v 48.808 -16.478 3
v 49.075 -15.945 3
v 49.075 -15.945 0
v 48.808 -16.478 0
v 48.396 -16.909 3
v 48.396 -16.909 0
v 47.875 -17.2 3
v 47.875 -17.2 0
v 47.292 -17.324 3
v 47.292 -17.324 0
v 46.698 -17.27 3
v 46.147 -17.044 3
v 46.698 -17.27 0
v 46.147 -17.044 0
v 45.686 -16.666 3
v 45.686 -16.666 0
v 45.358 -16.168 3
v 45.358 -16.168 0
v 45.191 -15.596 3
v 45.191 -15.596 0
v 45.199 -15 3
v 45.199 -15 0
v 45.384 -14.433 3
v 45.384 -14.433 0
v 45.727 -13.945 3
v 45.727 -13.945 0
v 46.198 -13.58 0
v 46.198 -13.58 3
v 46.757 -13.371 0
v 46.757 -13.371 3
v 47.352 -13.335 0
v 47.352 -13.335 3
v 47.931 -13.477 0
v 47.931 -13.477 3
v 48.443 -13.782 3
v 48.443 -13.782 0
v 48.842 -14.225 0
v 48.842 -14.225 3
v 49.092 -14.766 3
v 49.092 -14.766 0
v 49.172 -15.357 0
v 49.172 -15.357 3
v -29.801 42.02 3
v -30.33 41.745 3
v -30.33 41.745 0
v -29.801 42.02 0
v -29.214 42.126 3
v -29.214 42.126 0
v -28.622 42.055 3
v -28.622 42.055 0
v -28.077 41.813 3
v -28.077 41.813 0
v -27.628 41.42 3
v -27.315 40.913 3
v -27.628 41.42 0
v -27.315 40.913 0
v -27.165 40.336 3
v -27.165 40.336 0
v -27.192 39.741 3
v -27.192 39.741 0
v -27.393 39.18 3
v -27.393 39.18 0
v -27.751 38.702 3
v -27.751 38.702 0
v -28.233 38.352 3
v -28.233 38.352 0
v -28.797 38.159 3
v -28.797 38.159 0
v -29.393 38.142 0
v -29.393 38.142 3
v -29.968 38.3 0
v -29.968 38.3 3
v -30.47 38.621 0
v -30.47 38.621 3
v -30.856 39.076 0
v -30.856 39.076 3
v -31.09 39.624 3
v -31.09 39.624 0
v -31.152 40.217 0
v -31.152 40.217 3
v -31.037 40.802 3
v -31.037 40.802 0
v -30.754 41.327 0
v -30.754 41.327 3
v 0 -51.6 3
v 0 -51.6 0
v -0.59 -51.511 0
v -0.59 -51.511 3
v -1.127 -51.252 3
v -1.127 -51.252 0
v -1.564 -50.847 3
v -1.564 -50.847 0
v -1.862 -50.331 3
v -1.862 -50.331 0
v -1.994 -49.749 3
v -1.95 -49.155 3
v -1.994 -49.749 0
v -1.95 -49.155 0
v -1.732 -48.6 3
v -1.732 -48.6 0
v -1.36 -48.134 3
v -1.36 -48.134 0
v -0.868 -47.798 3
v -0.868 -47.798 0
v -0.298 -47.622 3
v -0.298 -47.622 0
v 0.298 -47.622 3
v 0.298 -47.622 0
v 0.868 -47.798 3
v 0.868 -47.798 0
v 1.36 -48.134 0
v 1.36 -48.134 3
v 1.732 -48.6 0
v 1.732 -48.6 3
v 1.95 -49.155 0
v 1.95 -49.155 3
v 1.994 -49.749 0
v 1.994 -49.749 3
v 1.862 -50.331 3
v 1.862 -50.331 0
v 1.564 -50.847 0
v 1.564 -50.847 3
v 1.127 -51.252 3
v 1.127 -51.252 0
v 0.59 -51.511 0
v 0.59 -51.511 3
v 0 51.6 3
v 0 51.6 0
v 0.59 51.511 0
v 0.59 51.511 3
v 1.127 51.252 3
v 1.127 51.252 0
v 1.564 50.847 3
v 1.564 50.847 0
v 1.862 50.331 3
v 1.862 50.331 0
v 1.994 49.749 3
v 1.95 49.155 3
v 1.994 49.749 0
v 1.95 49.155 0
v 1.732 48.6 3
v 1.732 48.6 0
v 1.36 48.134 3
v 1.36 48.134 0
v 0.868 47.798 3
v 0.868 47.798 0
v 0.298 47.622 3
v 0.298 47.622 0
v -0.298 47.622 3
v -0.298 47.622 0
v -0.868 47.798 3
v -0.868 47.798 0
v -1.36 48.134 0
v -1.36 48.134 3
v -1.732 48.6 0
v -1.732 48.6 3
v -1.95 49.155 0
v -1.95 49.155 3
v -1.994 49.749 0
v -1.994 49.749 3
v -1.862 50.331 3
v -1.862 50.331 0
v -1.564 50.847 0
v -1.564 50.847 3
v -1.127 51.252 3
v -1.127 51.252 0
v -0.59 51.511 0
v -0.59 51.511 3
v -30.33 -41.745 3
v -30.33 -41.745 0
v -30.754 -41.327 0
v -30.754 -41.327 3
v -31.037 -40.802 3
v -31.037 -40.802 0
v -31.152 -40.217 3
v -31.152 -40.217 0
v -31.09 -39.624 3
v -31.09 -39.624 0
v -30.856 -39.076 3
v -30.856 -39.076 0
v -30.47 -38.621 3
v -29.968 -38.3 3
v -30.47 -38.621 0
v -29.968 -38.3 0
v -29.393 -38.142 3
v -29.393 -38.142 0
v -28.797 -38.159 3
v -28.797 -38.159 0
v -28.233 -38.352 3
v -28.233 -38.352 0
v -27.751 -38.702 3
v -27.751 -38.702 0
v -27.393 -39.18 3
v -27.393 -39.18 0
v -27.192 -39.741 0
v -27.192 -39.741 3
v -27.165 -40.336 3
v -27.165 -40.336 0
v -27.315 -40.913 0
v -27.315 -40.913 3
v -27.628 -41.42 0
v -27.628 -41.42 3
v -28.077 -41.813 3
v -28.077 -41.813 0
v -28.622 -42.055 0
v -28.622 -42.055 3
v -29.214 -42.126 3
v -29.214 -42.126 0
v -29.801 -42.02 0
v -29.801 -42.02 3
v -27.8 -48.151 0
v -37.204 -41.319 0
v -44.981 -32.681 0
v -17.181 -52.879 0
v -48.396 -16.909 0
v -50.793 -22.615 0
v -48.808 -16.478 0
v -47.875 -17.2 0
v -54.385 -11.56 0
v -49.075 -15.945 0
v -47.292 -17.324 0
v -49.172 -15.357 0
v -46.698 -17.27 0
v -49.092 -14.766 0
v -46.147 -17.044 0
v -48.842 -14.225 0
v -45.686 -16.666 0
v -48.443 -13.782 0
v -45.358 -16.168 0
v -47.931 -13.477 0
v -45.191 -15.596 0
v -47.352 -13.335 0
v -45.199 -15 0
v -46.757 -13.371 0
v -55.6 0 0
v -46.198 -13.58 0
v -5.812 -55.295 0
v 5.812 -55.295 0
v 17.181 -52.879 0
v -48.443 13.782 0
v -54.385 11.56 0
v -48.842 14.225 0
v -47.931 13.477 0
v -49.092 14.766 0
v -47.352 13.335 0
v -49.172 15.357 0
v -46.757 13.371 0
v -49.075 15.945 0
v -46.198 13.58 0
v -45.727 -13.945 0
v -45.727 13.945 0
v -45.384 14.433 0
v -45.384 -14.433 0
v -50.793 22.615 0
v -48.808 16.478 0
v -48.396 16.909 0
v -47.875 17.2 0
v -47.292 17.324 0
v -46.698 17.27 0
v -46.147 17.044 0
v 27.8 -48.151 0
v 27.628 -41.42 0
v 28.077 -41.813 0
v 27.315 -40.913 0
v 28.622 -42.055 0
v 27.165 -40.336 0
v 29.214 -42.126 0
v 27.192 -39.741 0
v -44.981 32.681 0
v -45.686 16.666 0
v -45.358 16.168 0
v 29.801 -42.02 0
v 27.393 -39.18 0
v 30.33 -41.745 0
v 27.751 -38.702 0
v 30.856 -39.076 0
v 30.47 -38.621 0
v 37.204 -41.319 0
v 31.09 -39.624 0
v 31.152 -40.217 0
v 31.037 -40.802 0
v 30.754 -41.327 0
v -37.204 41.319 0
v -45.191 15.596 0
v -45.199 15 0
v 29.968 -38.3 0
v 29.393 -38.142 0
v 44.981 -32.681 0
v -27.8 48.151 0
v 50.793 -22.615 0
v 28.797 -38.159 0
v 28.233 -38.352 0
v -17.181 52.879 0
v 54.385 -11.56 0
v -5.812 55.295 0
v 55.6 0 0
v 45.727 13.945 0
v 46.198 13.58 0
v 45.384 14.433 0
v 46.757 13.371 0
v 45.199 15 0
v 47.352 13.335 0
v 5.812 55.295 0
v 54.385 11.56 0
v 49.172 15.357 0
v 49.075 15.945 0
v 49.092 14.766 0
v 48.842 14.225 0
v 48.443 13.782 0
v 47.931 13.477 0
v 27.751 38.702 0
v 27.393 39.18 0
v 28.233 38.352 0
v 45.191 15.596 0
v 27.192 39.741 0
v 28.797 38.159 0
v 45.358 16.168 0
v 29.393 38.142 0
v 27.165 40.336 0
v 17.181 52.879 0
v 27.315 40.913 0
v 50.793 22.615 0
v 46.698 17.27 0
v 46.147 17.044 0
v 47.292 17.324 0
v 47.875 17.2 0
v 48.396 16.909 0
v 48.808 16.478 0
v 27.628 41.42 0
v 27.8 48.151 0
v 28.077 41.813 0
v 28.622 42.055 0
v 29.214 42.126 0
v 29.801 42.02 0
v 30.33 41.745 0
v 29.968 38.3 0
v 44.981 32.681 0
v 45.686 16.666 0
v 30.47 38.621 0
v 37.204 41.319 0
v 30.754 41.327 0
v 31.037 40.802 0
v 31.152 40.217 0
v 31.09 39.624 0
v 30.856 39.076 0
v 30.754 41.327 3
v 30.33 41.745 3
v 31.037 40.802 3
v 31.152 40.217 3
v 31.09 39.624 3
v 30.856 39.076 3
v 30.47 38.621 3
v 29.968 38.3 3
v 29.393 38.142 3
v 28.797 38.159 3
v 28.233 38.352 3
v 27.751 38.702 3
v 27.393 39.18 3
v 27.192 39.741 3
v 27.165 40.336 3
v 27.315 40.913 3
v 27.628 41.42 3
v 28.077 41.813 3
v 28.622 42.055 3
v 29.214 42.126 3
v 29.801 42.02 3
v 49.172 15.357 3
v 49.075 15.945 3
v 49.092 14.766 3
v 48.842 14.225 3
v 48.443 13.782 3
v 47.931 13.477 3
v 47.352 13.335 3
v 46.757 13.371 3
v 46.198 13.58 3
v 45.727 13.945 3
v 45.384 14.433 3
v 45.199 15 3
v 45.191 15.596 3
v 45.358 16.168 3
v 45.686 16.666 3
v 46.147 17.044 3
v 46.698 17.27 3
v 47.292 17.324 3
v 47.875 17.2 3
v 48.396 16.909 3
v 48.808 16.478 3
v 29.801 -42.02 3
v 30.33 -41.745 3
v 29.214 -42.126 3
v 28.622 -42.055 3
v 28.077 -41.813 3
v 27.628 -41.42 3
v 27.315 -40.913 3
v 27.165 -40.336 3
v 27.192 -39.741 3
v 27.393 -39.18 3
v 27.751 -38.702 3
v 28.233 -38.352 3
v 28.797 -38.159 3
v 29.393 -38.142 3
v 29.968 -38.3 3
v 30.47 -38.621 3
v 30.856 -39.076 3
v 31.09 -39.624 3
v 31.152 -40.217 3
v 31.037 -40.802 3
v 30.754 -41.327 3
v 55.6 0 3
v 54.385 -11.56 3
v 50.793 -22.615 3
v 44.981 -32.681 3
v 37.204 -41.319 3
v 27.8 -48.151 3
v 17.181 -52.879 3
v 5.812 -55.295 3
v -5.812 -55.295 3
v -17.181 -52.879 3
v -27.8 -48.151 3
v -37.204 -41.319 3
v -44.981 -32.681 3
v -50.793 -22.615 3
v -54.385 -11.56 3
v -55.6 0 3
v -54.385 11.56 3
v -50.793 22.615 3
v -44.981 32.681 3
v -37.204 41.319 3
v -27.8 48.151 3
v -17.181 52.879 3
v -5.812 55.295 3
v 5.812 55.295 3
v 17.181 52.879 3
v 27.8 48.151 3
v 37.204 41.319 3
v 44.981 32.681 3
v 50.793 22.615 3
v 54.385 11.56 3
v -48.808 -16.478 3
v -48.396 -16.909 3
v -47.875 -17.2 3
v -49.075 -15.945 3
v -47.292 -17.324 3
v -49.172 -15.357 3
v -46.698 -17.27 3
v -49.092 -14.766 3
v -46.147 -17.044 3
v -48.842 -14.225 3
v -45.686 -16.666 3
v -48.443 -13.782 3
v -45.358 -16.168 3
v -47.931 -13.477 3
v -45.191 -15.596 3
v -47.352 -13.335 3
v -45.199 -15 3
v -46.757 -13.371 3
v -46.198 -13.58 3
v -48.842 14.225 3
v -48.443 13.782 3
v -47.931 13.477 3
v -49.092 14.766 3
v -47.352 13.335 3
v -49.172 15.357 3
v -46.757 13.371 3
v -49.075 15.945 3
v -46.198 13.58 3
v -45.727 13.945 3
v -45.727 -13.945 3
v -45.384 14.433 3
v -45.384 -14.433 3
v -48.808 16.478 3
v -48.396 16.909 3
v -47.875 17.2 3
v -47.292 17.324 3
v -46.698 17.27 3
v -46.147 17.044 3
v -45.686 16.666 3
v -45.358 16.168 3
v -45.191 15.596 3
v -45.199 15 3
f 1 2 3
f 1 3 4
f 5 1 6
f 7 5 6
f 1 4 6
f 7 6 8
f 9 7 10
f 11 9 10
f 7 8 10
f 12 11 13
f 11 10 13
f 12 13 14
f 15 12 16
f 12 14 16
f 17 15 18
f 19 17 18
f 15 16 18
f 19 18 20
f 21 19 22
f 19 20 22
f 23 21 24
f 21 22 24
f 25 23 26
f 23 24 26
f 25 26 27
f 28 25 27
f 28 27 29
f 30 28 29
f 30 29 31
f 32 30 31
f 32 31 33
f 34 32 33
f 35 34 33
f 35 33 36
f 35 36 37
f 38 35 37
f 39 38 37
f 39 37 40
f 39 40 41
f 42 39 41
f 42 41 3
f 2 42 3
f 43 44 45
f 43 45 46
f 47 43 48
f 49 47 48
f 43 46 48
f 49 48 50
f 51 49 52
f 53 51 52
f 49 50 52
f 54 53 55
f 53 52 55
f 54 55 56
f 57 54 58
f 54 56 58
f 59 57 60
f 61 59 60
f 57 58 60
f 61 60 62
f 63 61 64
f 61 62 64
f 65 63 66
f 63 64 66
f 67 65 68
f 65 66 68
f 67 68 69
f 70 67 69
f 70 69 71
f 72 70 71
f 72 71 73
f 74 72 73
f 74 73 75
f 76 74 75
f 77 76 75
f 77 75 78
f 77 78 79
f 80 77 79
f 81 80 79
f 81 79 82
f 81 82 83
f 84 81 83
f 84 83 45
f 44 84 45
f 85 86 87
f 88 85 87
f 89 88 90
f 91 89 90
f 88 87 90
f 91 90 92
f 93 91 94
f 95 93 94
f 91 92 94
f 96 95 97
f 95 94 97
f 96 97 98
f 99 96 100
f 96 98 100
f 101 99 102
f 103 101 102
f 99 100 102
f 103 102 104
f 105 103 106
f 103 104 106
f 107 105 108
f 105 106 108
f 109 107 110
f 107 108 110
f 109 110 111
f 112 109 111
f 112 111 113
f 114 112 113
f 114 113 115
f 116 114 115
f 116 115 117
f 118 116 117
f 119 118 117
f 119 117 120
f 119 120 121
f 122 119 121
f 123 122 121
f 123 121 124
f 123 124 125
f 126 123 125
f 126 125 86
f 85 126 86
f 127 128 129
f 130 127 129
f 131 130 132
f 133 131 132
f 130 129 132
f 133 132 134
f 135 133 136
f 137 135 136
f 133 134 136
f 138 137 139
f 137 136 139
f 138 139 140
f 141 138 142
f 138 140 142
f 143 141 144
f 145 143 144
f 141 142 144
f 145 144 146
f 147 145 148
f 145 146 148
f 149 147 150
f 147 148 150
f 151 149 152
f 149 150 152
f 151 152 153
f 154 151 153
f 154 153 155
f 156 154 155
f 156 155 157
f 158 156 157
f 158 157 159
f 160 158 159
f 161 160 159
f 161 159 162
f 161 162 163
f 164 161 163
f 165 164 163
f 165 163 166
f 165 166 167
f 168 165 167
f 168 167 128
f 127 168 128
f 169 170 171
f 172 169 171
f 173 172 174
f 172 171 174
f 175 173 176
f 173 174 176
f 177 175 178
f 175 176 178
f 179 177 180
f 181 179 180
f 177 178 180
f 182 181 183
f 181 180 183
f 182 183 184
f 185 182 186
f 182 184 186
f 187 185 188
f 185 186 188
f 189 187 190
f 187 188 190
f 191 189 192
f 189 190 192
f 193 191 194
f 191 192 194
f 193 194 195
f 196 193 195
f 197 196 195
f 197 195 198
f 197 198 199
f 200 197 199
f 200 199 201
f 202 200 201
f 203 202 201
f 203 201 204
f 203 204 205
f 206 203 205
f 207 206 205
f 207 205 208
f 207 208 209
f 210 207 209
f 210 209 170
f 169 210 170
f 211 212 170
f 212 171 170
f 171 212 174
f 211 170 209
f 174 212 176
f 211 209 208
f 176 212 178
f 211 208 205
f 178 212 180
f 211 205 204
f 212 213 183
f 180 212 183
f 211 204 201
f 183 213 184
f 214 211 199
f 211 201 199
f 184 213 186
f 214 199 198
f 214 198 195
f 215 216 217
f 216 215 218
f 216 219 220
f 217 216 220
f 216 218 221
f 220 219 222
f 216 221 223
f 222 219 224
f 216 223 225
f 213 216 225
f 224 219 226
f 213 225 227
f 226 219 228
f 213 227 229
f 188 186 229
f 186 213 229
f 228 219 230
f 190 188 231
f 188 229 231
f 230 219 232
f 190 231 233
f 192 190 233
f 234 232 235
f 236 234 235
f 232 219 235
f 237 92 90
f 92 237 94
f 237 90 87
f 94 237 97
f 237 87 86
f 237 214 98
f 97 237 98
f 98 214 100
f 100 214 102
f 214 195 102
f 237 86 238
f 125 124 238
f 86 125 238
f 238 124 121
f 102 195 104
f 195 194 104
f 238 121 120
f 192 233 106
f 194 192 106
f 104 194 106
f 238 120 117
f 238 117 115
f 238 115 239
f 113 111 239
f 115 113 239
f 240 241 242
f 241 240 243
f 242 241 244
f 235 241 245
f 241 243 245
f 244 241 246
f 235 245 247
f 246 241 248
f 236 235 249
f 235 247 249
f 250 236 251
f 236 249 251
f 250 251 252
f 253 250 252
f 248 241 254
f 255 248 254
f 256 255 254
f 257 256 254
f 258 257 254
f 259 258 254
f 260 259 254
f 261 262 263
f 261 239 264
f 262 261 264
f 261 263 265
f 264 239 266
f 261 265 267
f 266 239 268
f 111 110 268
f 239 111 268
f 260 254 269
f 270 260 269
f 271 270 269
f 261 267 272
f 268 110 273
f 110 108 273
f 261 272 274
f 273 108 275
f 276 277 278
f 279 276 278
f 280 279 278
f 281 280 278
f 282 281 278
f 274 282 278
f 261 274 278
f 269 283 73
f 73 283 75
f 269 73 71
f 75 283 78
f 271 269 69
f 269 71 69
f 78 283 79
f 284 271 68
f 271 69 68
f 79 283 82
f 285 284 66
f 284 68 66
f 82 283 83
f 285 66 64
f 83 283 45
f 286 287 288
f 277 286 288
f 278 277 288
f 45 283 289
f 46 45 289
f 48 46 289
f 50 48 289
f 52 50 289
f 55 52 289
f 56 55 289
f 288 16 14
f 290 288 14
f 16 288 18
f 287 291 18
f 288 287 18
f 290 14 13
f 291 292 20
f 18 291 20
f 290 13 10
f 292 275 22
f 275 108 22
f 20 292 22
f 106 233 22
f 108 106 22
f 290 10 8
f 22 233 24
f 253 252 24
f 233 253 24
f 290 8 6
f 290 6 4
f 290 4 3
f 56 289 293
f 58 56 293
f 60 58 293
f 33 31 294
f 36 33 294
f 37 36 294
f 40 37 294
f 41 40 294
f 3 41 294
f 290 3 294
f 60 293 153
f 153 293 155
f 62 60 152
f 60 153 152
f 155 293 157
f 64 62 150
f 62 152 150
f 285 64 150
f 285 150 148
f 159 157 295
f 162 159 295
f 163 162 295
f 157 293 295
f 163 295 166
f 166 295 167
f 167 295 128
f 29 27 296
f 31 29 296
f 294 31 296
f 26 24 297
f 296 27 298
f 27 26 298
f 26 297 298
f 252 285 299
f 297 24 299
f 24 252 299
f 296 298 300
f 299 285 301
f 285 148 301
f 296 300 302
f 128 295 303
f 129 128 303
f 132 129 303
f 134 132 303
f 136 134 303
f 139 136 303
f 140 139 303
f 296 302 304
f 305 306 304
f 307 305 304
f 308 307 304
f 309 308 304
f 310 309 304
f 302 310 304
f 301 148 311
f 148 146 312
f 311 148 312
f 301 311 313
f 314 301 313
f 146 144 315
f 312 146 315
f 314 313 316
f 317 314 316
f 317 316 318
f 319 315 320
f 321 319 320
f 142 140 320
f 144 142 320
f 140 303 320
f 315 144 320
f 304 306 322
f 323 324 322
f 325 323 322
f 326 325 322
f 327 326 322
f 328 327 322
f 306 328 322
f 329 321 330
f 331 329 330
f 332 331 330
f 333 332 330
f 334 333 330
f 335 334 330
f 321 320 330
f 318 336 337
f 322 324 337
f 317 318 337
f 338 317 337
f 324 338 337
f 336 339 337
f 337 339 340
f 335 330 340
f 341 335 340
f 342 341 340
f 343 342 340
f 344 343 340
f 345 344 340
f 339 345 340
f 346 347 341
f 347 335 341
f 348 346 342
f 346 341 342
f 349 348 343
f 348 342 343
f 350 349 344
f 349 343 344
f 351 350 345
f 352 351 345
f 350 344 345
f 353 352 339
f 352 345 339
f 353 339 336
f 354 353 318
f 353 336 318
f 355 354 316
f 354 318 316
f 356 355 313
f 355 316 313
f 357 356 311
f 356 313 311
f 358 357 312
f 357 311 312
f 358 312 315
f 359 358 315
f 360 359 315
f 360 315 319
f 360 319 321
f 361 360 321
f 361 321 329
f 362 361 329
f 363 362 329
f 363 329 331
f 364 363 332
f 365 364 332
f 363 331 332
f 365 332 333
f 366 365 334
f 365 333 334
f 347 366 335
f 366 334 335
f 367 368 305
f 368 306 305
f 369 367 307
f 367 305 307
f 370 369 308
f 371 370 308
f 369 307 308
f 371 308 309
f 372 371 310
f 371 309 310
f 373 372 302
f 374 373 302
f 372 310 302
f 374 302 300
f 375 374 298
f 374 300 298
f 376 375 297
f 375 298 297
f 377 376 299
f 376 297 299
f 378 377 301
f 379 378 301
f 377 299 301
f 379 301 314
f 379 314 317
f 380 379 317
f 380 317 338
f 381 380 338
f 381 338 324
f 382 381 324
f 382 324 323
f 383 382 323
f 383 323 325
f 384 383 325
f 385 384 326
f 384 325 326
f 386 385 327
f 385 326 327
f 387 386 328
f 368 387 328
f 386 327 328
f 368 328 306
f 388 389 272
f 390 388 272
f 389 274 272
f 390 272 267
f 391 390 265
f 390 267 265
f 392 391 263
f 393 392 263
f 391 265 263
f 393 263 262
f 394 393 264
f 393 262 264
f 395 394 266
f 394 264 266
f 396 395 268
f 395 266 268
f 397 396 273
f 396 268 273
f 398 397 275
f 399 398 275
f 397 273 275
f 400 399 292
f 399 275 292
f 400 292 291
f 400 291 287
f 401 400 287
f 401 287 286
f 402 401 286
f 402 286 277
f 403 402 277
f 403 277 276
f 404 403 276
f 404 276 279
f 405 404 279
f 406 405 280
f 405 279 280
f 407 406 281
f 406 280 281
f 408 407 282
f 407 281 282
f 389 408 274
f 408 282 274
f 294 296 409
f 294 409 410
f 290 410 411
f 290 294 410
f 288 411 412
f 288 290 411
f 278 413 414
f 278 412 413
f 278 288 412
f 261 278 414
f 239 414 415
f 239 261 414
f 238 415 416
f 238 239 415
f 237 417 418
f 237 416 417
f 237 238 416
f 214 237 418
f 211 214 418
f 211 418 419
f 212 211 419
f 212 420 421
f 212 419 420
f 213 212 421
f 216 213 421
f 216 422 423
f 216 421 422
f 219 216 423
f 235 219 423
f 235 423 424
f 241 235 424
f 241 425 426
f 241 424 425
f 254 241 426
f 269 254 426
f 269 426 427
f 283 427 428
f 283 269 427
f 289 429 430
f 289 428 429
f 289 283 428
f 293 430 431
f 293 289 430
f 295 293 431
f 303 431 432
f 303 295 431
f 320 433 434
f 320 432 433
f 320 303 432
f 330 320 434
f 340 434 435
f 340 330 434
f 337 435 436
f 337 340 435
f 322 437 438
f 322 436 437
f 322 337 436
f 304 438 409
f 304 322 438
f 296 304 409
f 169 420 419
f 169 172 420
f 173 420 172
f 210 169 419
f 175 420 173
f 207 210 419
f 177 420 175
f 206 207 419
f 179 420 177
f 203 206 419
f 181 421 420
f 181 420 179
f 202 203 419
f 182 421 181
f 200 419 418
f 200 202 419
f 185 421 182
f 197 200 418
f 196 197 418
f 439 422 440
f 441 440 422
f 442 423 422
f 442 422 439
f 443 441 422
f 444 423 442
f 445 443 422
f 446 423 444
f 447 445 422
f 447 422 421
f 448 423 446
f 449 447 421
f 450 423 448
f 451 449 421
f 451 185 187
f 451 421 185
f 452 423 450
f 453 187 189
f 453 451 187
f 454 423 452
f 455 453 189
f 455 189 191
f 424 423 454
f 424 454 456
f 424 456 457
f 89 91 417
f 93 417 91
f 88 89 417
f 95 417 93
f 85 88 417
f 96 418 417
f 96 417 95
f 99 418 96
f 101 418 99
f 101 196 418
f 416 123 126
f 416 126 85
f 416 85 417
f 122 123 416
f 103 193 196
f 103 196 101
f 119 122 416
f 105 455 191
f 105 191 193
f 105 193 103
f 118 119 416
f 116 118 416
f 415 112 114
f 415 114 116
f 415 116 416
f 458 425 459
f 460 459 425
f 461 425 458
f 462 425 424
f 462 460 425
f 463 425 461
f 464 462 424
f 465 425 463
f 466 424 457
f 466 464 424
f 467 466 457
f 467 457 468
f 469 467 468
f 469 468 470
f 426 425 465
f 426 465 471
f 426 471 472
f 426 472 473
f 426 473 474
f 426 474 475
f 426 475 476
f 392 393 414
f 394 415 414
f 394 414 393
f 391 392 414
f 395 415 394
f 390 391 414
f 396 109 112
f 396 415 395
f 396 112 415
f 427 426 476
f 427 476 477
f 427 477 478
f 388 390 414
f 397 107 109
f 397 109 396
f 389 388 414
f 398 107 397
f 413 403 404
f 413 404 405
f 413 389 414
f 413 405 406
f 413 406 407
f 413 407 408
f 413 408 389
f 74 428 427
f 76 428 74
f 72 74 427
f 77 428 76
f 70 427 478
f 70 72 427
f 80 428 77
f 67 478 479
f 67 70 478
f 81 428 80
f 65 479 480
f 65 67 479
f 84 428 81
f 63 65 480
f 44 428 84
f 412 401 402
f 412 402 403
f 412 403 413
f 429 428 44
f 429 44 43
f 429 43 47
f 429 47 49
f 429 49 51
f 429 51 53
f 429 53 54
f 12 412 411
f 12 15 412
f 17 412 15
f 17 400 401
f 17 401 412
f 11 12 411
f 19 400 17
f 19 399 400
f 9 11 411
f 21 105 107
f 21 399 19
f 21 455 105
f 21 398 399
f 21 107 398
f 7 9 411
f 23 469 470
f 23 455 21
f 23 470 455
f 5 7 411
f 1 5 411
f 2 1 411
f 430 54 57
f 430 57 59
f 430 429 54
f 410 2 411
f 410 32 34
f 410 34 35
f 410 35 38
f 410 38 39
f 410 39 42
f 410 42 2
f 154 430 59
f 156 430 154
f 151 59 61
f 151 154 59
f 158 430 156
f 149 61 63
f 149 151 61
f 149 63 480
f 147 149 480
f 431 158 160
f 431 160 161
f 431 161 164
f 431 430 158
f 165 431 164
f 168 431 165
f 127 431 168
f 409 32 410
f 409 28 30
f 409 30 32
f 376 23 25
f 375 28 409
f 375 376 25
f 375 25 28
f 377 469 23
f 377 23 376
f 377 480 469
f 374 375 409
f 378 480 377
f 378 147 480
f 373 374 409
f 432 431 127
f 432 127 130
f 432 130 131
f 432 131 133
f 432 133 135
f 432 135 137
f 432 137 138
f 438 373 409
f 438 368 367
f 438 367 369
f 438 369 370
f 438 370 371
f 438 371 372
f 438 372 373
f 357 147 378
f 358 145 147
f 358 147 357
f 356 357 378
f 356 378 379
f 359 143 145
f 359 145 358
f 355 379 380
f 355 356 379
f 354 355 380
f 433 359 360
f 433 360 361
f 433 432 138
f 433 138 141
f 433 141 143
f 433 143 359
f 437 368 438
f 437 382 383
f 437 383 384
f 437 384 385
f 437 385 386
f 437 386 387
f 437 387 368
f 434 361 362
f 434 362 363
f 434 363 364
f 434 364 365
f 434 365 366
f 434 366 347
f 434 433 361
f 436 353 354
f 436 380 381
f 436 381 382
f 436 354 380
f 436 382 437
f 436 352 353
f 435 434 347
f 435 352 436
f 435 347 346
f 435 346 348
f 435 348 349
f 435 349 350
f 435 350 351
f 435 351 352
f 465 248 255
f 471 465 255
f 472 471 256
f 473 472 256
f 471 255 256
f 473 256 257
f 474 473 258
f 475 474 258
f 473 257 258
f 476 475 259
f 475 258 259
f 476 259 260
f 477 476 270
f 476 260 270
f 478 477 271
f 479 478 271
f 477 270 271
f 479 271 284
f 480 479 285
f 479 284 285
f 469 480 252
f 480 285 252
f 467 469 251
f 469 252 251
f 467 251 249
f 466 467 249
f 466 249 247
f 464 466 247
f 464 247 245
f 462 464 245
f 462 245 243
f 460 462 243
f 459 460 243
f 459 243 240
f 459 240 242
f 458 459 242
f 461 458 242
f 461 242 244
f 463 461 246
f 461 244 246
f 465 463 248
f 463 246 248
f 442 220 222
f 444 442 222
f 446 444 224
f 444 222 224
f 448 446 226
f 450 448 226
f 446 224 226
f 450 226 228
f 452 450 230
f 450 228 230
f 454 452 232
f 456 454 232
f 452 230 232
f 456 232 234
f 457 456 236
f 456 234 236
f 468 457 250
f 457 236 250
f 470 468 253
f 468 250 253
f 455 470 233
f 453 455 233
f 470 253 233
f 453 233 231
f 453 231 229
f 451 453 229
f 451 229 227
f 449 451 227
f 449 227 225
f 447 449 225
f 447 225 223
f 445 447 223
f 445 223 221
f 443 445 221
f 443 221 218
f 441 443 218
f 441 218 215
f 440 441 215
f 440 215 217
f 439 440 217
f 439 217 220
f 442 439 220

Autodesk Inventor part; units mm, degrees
ref_plane "YZ Plane" through (0, 0, 0) normal (1, 0, 0) x (0, 1, 0)
ref_plane "XZ Plane" through (0, 0, 0) normal (0, 1, 0) x (-1, 0, 0)
ref_plane "XY Plane" through (0, 0, 0) normal (0, 0, 1) x (1, 0, 0)
ref_plane "Work Plane1" through (0, 0, 0) normal (0, 0, 1) x (1, 0, 0)
sketch "Sketch1" plane through (0, 0, 0) normal (0, 0, 1) x (1, 0, 0)
  circle A0 centre (0, 0) radius 55.6 projected
extrude "Extrusion1" add sketch "Sketch1" along normal blind 3
sketch "Sketch2" plane through (0, 0, 3) normal (0, 0, 1) x (1, 0, 0)
  circle A0 centre (-29.1541, 40.1272) radius 1.45 projected
  circle A1 centre (-47.1724, 15.3272) radius 1.45 projected
  circle A2 centre (-47.1724, -15.3272) radius 1.45 projected
  circle A3 centre (-29.1541, -40.1272) radius 1.45 projected
  circle A4 centre (0, -49.6) radius 1.45 projected
  circle A5 centre (29.1541, -40.1272) radius 1.45 projected
  circle A6 centre (47.1724, -15.3272) radius 1.45 projected
  circle A7 centre (47.1724, 15.3272) radius 1.45 projected
  circle A8 centre (29.1541, 40.1272) radius 1.45 projected
  circle A9 centre (0, 49.6) radius 1.45 projected
  circle A10 centre (0, 0) radius 55.6 projected
  circle A11 centre (0, 0) radius 44.6 projected
hole "Hole1" at (0, -49.6, 3) direction (0, 0, -1) diameter 4 end through all
pattern_circular "Circular Pattern1" count 10 over 360 about axis through (0, 0, 0) along (0, 0, 1) of "Hole1"
sketch "Sketch3" plane through (0, 0, 3) normal (0, 0, 1) x (1, 0, 0)
  circle A0 centre (-29.1541, -40.1272) radius 2 projected
  circle A1 centre (-47.1724, -15.3272) radius 2 projected
  circle A2 centre (-47.1724, 15.3272) radius 2 projected
  circle A3 centre (-29.1541, 40.1272) radius 2 projected
  circle A4 centre (0, 49.6) radius 2 projected
  circle A5 centre (29.1541, 40.1272) radius 2 projected
  circle A6 centre (47.1724, 15.3272) radius 2 projected
  circle A7 centre (47.1724, -15.3272) radius 2 projected
  circle A8 centre (29.1541, -40.1272) radius 2 projected
  circle A9 centre (0, -49.6) radius 2 projected
  circle A10 centre (0, 0) radius 55.6 projected
properties part number "Anglerfish_Frontwindow_3inchtube_V0"
